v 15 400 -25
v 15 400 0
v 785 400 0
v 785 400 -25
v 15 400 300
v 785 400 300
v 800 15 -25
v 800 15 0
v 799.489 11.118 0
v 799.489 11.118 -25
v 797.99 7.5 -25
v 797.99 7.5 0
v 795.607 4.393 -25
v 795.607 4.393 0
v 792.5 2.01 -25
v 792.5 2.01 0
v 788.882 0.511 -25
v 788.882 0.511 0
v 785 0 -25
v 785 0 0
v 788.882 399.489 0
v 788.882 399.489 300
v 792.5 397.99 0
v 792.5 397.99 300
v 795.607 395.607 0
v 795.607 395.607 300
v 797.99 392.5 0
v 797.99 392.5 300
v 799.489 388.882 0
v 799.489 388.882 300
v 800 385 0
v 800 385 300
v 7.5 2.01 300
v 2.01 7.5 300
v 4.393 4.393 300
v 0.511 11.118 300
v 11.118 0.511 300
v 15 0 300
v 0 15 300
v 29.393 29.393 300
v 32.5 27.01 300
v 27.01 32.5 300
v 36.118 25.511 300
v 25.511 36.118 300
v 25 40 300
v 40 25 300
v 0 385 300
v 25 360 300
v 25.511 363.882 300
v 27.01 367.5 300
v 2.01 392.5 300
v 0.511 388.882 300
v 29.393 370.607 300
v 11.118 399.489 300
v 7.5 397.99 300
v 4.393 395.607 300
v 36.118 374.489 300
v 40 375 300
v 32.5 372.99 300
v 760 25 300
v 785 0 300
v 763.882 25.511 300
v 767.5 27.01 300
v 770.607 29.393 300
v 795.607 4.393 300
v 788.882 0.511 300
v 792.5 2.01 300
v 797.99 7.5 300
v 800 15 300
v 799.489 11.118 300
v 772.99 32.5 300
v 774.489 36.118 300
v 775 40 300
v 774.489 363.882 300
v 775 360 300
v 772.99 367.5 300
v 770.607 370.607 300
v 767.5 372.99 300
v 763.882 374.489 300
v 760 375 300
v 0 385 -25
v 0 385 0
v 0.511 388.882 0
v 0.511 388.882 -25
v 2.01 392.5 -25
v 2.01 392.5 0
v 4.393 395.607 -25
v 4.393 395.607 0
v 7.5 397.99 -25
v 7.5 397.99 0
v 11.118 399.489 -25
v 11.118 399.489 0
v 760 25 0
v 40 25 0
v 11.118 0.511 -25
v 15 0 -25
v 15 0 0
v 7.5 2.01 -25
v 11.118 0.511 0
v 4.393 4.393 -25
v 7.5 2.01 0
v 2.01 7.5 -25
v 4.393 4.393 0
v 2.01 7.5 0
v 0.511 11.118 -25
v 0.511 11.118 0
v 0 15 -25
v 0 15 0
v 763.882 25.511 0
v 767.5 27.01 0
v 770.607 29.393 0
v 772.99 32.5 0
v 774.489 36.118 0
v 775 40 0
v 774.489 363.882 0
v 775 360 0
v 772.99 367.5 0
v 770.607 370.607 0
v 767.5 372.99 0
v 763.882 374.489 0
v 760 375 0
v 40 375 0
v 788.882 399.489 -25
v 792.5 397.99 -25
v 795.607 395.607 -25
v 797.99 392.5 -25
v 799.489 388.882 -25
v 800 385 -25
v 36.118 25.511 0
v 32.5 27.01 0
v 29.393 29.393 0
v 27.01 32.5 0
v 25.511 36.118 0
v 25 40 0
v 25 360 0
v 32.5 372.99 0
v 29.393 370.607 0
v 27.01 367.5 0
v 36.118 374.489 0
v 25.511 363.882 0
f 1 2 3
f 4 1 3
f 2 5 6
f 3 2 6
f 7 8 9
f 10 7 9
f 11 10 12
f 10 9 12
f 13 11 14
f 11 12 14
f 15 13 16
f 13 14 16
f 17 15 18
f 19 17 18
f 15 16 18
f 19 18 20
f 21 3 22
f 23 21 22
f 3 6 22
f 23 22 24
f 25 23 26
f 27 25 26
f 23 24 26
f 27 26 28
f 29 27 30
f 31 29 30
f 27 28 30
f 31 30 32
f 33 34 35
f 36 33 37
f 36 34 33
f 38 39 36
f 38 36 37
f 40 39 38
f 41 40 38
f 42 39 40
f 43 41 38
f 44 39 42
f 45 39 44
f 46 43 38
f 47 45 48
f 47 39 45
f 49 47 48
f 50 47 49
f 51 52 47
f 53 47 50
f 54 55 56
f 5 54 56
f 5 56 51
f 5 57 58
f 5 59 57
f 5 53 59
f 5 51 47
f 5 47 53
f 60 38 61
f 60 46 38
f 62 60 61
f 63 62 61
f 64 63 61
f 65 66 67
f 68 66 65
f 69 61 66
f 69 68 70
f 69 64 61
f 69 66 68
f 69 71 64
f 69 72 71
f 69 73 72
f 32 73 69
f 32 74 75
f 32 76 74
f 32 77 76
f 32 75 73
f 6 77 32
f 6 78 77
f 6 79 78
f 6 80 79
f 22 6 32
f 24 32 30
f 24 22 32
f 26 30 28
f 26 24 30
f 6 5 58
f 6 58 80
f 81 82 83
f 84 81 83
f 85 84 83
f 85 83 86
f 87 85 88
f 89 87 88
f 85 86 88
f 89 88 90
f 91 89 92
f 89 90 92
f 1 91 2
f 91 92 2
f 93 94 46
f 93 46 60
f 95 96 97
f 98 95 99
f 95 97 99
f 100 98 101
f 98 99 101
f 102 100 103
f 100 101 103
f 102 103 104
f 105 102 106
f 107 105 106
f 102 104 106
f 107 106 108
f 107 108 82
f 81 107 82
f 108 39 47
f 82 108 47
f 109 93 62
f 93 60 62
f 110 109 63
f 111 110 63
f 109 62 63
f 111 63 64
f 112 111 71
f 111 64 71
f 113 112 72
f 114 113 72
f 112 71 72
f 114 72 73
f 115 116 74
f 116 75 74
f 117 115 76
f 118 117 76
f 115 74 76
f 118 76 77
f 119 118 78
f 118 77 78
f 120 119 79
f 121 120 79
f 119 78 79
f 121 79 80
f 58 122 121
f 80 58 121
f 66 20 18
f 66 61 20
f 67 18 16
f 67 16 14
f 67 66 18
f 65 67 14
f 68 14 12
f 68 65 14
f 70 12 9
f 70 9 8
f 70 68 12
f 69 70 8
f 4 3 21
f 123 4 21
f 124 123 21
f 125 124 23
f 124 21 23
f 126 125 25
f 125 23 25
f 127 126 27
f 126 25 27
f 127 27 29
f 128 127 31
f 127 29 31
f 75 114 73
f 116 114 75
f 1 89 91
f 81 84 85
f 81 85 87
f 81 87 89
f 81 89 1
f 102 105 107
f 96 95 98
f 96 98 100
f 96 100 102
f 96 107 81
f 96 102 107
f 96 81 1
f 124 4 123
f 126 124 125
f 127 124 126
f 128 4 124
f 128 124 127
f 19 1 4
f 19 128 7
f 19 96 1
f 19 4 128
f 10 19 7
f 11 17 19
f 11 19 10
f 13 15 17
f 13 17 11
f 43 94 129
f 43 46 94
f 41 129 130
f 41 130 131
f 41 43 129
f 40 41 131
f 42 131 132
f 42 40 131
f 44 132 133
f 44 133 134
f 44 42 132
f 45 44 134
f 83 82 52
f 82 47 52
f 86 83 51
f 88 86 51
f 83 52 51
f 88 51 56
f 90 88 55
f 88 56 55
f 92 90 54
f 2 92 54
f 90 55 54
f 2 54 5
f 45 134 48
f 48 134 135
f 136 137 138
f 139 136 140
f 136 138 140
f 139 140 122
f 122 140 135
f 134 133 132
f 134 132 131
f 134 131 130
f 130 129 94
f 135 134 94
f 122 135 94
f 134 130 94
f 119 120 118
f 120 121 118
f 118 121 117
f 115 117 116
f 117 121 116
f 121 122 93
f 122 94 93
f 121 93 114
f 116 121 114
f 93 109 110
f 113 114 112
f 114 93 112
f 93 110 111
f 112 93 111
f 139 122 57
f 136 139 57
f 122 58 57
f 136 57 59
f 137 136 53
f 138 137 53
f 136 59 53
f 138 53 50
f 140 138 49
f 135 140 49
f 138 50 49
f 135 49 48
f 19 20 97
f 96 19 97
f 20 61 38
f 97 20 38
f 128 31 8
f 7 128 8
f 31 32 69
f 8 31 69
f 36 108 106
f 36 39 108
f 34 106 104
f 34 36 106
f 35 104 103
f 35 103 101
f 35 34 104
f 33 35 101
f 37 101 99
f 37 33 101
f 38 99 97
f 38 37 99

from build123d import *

# Parameters (mm, degrees)
F0_W     = 800
F0_H     = 400
F0_W_2   = 750
F0_H_2   = 350
F1_DEPTH = 300
F2_R     = 15
F4_DEPTH = 25


with BuildPart() as f1:
    # F0 (on Top) → F1 (new body)
    with BuildSketch(Plane.XY):
        with Locations((400, 200)):
            Rectangle(F0_W, F0_H)
        with Locations((400, 200)):
            Rectangle(F0_W_2, F0_H_2, mode=Mode.SUBTRACT)
    extrude(amount=F1_DEPTH)

    # F2
    f2_edges = [f1.edges().sort_by_distance(p)[0] for p in [
        (0, 0, 150),
        (800, 0, 150),
        (0, 400, 150),
        (800, 400, 150),
        (25, 25, 150),
        (25, 375, 150),
        (775, 25, 150),
        (775, 375, 150),
    ]]
    fillet(f2_edges, radius=F2_R)

    # F3 (on face) → F4 (join)
    with BuildSketch(Plane(origin=(0, 0, 0), x_dir=(1, 0, 0), z_dir=(0, 0, -1))):
        with BuildLine():
            ThreePointArc((800, -15), (795.606602, -4.393398), (785, 0))
            Line((785, 0), (15, 0))
            ThreePointArc((15, 0), (4.393398, -4.393398), (0, -15))
            Line((0, -15), (0, -385))
            ThreePointArc((0, -385), (4.393398, -395.606602), (15, -400))
            Line((15, -400), (785, -400))
            ThreePointArc((785, -400), (795.606602, -395.606602), (800, -385))
            Line((800, -385), (800, -15))
        make_face()
    extrude(amount=F4_DEPTH)


solid = f1.part
